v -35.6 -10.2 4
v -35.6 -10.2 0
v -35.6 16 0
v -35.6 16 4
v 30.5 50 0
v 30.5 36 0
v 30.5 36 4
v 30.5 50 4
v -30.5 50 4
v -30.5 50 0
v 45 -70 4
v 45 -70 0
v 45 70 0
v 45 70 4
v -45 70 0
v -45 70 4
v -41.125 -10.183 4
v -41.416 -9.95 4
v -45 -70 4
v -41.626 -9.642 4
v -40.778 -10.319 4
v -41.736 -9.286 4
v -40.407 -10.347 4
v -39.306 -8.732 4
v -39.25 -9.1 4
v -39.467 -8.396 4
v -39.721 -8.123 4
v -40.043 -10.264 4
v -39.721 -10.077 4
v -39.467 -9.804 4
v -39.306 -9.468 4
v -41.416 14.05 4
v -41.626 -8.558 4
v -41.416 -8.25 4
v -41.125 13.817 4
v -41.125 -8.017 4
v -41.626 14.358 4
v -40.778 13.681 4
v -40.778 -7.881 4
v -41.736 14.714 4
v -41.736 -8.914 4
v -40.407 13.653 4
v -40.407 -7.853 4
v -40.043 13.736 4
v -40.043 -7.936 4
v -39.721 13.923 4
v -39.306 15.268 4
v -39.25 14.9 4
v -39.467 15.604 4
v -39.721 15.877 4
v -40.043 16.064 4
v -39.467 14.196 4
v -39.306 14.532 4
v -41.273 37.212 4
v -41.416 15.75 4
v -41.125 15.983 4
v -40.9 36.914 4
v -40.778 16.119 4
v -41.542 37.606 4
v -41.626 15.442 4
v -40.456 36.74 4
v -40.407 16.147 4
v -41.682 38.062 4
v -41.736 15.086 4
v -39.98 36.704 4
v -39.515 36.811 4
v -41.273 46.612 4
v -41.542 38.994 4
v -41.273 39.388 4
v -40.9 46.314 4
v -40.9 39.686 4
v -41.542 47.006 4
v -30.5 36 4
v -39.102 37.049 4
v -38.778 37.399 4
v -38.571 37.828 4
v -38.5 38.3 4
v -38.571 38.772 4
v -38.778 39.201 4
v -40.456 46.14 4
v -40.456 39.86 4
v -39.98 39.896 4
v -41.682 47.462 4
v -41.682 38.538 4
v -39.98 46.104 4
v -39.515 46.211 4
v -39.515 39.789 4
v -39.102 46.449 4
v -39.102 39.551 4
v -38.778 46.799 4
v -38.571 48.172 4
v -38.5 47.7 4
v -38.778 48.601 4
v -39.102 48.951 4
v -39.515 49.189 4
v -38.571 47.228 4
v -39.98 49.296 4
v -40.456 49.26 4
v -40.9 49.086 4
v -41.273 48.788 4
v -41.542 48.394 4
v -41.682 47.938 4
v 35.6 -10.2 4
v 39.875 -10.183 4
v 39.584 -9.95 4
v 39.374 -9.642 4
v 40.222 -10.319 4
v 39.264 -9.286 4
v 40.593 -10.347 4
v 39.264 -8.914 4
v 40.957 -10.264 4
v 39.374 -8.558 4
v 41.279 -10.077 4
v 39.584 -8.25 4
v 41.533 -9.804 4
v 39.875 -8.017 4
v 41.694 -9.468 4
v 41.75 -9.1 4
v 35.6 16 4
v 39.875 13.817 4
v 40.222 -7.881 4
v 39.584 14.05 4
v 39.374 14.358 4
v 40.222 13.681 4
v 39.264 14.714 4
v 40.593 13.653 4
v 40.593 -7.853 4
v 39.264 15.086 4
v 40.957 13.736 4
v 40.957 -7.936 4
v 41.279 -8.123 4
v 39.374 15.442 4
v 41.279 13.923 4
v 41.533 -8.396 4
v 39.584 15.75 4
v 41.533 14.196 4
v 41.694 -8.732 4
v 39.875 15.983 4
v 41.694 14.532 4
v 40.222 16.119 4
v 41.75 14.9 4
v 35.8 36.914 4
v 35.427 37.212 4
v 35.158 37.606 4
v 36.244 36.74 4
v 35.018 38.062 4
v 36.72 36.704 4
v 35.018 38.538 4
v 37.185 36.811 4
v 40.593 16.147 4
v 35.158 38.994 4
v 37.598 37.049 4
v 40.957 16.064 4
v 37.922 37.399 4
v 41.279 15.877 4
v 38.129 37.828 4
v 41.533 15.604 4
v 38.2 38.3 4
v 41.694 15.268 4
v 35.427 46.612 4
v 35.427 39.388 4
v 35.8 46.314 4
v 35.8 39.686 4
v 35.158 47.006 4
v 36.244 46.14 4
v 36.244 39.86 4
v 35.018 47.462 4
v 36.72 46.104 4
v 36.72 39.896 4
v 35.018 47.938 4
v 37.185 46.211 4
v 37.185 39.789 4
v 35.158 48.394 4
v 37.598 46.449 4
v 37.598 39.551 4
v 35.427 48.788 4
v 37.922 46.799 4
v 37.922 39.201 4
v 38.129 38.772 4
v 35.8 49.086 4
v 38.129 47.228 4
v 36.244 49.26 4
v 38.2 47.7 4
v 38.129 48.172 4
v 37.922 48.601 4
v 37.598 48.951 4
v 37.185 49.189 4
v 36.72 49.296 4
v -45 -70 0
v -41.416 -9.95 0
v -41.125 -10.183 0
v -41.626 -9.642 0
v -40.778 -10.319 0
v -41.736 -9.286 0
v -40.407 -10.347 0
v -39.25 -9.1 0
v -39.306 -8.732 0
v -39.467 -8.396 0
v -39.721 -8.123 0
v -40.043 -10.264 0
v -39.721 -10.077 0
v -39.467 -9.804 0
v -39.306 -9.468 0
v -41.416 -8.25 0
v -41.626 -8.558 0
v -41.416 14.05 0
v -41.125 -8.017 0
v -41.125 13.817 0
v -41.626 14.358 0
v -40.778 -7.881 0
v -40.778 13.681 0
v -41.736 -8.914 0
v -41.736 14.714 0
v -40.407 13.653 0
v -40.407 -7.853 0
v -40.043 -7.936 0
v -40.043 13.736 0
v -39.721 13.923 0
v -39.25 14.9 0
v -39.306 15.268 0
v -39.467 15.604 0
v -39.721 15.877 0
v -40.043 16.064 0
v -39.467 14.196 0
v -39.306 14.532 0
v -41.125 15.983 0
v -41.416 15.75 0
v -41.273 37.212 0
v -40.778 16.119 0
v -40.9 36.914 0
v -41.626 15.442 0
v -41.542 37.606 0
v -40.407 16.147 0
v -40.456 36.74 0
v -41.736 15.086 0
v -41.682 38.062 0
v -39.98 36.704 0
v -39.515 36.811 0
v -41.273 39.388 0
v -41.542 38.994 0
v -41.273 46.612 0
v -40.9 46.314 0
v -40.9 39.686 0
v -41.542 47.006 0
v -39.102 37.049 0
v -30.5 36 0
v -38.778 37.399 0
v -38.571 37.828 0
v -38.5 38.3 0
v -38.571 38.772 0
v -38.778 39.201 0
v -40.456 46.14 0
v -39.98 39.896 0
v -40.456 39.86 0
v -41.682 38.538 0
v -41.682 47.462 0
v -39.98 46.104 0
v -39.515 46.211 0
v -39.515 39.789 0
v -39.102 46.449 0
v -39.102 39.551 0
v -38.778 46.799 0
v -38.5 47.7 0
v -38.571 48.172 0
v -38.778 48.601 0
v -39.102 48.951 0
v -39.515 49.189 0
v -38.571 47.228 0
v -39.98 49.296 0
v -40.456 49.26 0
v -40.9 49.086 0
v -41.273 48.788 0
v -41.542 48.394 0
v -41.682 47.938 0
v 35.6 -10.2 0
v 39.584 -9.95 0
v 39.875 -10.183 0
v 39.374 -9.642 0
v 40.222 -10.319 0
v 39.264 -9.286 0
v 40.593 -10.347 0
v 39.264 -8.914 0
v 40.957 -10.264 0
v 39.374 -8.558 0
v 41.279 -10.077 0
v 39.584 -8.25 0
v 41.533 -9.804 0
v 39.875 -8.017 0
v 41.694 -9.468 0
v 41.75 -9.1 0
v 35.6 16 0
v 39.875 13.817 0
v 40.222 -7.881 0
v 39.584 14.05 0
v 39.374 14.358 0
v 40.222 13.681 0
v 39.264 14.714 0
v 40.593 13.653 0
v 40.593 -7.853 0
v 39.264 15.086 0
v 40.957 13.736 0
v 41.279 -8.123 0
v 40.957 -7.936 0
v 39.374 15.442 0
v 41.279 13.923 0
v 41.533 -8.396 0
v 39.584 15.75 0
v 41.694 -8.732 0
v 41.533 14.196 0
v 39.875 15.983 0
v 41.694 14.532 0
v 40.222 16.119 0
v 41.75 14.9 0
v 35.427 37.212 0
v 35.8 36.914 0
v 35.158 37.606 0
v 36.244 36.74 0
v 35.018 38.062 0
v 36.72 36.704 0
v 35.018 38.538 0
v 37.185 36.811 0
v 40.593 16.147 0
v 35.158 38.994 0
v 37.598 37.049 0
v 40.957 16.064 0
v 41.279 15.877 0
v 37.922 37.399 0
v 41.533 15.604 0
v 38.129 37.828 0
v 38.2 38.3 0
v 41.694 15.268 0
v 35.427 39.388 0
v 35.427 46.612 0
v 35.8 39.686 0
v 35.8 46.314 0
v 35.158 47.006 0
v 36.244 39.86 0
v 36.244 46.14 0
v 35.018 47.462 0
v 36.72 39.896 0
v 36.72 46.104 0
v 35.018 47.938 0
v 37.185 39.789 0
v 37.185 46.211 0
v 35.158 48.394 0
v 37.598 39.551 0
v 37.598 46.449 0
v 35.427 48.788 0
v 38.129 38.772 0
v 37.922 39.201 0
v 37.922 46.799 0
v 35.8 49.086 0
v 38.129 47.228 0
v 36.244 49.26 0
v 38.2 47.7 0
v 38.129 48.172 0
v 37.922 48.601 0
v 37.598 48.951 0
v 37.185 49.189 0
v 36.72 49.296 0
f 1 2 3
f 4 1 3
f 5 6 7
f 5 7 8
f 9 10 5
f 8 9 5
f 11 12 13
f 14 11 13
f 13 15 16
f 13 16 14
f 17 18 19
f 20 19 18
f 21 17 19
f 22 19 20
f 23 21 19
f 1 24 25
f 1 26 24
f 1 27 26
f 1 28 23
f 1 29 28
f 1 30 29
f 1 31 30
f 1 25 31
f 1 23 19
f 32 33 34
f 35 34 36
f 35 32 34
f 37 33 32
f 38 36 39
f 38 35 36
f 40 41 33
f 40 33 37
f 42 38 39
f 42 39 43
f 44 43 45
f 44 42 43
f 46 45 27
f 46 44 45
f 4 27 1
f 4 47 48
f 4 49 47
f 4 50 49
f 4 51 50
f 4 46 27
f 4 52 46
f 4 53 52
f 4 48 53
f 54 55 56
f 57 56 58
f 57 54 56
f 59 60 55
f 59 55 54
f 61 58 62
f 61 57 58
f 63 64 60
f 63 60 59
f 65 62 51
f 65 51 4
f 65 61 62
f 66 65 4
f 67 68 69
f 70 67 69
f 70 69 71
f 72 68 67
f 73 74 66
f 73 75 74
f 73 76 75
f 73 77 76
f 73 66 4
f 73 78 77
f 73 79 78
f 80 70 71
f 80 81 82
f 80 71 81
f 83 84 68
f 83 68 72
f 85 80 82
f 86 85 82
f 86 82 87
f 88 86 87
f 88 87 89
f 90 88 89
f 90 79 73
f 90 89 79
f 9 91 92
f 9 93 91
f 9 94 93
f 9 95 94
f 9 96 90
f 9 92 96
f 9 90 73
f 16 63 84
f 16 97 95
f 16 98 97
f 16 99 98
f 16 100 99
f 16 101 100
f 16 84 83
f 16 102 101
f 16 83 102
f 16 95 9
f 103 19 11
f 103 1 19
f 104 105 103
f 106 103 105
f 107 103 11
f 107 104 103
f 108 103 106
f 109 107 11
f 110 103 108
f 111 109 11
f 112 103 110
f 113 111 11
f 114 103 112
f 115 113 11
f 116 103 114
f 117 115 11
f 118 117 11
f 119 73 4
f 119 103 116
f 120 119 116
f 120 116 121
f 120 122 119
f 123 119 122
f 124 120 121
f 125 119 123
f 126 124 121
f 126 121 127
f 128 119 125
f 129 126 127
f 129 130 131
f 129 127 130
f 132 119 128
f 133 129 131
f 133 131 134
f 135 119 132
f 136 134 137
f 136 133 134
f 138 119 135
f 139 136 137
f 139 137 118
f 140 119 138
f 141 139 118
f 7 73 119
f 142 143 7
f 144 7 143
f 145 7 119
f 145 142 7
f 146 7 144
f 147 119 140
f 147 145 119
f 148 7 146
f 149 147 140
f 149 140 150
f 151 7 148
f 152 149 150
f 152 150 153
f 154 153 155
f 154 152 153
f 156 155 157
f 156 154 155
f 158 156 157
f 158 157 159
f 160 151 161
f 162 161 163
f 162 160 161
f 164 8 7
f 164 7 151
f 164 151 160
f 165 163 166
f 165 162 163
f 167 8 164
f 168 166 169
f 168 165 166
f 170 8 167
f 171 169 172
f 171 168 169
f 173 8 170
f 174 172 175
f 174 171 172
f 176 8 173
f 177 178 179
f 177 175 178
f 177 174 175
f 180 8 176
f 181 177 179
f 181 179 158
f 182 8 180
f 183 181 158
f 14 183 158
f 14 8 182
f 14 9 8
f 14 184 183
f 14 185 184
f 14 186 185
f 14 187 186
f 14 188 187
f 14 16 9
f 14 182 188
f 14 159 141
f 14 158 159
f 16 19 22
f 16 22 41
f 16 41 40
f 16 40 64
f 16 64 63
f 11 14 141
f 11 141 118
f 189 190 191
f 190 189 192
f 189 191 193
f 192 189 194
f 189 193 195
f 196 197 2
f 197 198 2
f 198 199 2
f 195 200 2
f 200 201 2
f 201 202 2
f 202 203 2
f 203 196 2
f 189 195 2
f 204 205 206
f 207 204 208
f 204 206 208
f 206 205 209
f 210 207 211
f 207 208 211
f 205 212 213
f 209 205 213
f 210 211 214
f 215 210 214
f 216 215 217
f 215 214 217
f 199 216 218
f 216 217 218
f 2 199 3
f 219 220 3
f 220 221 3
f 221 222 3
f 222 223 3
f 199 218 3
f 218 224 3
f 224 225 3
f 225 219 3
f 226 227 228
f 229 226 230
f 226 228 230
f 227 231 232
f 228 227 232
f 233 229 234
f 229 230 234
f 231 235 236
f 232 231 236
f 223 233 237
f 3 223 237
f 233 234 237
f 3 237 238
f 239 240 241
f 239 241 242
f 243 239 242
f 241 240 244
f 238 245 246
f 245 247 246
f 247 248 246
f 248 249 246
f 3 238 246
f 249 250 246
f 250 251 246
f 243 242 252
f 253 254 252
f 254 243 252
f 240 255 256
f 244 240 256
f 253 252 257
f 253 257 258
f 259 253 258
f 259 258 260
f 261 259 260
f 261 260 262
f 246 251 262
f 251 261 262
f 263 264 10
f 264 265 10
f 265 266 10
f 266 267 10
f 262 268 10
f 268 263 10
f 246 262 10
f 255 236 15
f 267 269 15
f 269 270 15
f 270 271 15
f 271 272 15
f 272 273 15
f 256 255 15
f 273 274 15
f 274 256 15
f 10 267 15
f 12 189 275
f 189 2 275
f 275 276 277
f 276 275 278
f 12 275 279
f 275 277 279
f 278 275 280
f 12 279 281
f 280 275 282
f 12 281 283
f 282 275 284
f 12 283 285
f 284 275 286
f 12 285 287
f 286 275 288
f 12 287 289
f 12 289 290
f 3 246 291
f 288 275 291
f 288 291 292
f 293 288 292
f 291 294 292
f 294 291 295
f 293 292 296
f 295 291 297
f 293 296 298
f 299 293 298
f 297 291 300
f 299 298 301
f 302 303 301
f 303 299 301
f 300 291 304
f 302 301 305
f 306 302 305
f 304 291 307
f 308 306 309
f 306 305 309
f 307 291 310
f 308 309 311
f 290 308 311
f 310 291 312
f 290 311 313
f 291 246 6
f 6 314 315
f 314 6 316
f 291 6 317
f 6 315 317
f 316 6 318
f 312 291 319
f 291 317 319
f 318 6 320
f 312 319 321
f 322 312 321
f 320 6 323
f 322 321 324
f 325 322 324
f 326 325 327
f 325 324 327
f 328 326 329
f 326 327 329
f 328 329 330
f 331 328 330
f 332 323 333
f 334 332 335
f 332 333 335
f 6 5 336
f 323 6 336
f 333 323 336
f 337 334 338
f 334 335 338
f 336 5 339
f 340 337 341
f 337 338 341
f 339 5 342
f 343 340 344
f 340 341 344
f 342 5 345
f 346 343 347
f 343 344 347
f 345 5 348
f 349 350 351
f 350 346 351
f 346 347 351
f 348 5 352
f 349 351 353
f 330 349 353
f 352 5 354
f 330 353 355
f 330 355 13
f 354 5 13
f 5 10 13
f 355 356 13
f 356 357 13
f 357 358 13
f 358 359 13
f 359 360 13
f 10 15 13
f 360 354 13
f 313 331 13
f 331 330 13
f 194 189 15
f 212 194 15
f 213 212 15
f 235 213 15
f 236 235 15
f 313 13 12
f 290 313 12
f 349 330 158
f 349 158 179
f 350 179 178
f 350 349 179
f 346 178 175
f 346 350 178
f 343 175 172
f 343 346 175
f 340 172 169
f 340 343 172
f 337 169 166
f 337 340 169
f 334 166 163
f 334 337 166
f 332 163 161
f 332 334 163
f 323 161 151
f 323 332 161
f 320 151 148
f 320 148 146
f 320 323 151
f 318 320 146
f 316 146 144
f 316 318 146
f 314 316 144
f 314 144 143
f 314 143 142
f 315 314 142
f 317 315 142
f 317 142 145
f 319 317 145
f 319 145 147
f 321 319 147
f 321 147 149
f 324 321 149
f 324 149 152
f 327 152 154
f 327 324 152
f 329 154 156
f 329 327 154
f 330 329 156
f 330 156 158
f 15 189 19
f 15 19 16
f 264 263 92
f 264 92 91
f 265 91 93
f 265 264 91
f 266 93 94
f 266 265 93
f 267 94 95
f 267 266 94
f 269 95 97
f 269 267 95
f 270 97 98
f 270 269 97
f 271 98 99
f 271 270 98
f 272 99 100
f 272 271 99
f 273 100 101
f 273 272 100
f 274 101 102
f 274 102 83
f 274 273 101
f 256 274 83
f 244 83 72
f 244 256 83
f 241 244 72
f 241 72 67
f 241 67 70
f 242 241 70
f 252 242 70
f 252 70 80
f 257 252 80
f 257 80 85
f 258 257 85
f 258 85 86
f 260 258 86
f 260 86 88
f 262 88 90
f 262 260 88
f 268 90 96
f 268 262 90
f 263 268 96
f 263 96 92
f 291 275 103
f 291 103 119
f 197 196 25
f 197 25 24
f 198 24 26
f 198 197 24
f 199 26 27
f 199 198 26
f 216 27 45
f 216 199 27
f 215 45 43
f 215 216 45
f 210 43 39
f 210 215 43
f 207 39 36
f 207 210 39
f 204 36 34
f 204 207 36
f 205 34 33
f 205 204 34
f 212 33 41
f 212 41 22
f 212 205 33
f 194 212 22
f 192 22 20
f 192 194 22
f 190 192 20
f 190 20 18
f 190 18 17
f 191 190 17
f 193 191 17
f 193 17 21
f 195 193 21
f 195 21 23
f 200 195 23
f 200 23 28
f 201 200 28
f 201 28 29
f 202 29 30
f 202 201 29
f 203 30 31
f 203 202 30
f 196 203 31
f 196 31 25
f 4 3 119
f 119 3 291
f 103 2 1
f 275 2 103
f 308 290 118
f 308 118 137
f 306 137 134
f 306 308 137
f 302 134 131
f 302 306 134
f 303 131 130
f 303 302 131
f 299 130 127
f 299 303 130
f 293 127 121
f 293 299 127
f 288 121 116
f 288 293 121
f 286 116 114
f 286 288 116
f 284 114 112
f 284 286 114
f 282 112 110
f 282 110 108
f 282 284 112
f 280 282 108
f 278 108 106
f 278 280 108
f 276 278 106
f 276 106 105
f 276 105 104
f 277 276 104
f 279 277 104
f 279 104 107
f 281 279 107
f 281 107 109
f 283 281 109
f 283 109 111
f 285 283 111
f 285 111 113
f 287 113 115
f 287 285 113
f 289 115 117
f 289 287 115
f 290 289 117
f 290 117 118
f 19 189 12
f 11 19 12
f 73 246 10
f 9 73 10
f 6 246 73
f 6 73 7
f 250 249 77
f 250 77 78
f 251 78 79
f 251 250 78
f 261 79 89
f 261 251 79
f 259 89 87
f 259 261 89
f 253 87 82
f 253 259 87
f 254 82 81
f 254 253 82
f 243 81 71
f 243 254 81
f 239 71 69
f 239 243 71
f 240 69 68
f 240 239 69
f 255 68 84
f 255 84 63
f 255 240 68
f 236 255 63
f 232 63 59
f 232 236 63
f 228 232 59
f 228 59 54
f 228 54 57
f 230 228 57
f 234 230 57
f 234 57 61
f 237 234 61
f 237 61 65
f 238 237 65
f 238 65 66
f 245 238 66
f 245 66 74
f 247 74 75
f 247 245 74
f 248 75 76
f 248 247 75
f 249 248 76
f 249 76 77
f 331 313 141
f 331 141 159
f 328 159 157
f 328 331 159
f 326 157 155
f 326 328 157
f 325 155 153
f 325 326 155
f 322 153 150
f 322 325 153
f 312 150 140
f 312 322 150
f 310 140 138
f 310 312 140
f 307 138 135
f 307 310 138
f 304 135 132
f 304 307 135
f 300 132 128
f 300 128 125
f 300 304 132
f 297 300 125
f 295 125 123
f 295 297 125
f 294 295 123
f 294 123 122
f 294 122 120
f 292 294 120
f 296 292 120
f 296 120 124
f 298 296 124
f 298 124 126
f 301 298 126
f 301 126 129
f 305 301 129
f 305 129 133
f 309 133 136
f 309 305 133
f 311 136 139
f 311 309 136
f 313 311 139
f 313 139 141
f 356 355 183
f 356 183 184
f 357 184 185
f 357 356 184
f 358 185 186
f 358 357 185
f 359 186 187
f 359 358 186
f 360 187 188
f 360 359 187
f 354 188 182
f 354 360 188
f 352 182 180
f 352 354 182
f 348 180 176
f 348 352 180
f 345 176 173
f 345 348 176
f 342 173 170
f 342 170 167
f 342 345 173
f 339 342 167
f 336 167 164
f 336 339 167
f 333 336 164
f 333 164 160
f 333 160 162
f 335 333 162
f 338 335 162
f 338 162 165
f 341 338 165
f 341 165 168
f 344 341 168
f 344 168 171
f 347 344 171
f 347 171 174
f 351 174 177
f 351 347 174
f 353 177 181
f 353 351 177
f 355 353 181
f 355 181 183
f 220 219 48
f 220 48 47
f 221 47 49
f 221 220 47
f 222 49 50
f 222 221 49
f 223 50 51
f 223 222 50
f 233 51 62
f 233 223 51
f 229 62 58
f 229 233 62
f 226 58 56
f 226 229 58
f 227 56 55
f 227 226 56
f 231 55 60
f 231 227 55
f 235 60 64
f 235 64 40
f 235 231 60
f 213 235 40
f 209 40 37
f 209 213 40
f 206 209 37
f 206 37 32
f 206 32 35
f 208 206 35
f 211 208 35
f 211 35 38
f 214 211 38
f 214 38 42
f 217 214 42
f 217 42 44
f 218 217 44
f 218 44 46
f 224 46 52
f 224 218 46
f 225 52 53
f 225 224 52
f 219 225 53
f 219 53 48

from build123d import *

# Parameters (mm, degrees)
SKETCH_W   = 90
SKETCH_H   = 140
SKETCH_R   = 1.25
SKETCH_R_2 = 1.6
SKETCH_W_2 = 71.2
SKETCH_H_2 = 26.2
SKETCH_W_3 = 61
SKETCH_H_3 = 14
PAD_DEPTH  = 4


with BuildPart() as part:
    # Sketch → Pad (new body)
    with BuildSketch(Plane.XY):
        Rectangle(SKETCH_W, SKETCH_H)
        with Locations((-40.5, 14.9)):
            Circle(SKETCH_R, mode=Mode.SUBTRACT)
        with Locations((-40.5, -9.1)):
            Circle(SKETCH_R, mode=Mode.SUBTRACT)
        with Locations((40.5, 14.9)):
            Circle(SKETCH_R, mode=Mode.SUBTRACT)
        with Locations((40.5, -9.1)):
            Circle(SKETCH_R, mode=Mode.SUBTRACT)
        with Locations((-40.1, 47.7)):
            Circle(SKETCH_R_2, mode=Mode.SUBTRACT)
        with Locations((-40.1, 38.3)):
            Circle(SKETCH_R_2, mode=Mode.SUBTRACT)
        with Locations((36.6, 47.7)):
            Circle(SKETCH_R_2, mode=Mode.SUBTRACT)
        with Locations((36.6, 38.3)):
            Circle(SKETCH_R_2, mode=Mode.SUBTRACT)
        with Locations((0, 2.9)):
            Rectangle(SKETCH_W_2, SKETCH_H_2, mode=Mode.SUBTRACT)
        with Locations((0, 43)):
            Rectangle(SKETCH_W_3, SKETCH_H_3, mode=Mode.SUBTRACT)
    extrude(amount=PAD_DEPTH)


solid = part.part
